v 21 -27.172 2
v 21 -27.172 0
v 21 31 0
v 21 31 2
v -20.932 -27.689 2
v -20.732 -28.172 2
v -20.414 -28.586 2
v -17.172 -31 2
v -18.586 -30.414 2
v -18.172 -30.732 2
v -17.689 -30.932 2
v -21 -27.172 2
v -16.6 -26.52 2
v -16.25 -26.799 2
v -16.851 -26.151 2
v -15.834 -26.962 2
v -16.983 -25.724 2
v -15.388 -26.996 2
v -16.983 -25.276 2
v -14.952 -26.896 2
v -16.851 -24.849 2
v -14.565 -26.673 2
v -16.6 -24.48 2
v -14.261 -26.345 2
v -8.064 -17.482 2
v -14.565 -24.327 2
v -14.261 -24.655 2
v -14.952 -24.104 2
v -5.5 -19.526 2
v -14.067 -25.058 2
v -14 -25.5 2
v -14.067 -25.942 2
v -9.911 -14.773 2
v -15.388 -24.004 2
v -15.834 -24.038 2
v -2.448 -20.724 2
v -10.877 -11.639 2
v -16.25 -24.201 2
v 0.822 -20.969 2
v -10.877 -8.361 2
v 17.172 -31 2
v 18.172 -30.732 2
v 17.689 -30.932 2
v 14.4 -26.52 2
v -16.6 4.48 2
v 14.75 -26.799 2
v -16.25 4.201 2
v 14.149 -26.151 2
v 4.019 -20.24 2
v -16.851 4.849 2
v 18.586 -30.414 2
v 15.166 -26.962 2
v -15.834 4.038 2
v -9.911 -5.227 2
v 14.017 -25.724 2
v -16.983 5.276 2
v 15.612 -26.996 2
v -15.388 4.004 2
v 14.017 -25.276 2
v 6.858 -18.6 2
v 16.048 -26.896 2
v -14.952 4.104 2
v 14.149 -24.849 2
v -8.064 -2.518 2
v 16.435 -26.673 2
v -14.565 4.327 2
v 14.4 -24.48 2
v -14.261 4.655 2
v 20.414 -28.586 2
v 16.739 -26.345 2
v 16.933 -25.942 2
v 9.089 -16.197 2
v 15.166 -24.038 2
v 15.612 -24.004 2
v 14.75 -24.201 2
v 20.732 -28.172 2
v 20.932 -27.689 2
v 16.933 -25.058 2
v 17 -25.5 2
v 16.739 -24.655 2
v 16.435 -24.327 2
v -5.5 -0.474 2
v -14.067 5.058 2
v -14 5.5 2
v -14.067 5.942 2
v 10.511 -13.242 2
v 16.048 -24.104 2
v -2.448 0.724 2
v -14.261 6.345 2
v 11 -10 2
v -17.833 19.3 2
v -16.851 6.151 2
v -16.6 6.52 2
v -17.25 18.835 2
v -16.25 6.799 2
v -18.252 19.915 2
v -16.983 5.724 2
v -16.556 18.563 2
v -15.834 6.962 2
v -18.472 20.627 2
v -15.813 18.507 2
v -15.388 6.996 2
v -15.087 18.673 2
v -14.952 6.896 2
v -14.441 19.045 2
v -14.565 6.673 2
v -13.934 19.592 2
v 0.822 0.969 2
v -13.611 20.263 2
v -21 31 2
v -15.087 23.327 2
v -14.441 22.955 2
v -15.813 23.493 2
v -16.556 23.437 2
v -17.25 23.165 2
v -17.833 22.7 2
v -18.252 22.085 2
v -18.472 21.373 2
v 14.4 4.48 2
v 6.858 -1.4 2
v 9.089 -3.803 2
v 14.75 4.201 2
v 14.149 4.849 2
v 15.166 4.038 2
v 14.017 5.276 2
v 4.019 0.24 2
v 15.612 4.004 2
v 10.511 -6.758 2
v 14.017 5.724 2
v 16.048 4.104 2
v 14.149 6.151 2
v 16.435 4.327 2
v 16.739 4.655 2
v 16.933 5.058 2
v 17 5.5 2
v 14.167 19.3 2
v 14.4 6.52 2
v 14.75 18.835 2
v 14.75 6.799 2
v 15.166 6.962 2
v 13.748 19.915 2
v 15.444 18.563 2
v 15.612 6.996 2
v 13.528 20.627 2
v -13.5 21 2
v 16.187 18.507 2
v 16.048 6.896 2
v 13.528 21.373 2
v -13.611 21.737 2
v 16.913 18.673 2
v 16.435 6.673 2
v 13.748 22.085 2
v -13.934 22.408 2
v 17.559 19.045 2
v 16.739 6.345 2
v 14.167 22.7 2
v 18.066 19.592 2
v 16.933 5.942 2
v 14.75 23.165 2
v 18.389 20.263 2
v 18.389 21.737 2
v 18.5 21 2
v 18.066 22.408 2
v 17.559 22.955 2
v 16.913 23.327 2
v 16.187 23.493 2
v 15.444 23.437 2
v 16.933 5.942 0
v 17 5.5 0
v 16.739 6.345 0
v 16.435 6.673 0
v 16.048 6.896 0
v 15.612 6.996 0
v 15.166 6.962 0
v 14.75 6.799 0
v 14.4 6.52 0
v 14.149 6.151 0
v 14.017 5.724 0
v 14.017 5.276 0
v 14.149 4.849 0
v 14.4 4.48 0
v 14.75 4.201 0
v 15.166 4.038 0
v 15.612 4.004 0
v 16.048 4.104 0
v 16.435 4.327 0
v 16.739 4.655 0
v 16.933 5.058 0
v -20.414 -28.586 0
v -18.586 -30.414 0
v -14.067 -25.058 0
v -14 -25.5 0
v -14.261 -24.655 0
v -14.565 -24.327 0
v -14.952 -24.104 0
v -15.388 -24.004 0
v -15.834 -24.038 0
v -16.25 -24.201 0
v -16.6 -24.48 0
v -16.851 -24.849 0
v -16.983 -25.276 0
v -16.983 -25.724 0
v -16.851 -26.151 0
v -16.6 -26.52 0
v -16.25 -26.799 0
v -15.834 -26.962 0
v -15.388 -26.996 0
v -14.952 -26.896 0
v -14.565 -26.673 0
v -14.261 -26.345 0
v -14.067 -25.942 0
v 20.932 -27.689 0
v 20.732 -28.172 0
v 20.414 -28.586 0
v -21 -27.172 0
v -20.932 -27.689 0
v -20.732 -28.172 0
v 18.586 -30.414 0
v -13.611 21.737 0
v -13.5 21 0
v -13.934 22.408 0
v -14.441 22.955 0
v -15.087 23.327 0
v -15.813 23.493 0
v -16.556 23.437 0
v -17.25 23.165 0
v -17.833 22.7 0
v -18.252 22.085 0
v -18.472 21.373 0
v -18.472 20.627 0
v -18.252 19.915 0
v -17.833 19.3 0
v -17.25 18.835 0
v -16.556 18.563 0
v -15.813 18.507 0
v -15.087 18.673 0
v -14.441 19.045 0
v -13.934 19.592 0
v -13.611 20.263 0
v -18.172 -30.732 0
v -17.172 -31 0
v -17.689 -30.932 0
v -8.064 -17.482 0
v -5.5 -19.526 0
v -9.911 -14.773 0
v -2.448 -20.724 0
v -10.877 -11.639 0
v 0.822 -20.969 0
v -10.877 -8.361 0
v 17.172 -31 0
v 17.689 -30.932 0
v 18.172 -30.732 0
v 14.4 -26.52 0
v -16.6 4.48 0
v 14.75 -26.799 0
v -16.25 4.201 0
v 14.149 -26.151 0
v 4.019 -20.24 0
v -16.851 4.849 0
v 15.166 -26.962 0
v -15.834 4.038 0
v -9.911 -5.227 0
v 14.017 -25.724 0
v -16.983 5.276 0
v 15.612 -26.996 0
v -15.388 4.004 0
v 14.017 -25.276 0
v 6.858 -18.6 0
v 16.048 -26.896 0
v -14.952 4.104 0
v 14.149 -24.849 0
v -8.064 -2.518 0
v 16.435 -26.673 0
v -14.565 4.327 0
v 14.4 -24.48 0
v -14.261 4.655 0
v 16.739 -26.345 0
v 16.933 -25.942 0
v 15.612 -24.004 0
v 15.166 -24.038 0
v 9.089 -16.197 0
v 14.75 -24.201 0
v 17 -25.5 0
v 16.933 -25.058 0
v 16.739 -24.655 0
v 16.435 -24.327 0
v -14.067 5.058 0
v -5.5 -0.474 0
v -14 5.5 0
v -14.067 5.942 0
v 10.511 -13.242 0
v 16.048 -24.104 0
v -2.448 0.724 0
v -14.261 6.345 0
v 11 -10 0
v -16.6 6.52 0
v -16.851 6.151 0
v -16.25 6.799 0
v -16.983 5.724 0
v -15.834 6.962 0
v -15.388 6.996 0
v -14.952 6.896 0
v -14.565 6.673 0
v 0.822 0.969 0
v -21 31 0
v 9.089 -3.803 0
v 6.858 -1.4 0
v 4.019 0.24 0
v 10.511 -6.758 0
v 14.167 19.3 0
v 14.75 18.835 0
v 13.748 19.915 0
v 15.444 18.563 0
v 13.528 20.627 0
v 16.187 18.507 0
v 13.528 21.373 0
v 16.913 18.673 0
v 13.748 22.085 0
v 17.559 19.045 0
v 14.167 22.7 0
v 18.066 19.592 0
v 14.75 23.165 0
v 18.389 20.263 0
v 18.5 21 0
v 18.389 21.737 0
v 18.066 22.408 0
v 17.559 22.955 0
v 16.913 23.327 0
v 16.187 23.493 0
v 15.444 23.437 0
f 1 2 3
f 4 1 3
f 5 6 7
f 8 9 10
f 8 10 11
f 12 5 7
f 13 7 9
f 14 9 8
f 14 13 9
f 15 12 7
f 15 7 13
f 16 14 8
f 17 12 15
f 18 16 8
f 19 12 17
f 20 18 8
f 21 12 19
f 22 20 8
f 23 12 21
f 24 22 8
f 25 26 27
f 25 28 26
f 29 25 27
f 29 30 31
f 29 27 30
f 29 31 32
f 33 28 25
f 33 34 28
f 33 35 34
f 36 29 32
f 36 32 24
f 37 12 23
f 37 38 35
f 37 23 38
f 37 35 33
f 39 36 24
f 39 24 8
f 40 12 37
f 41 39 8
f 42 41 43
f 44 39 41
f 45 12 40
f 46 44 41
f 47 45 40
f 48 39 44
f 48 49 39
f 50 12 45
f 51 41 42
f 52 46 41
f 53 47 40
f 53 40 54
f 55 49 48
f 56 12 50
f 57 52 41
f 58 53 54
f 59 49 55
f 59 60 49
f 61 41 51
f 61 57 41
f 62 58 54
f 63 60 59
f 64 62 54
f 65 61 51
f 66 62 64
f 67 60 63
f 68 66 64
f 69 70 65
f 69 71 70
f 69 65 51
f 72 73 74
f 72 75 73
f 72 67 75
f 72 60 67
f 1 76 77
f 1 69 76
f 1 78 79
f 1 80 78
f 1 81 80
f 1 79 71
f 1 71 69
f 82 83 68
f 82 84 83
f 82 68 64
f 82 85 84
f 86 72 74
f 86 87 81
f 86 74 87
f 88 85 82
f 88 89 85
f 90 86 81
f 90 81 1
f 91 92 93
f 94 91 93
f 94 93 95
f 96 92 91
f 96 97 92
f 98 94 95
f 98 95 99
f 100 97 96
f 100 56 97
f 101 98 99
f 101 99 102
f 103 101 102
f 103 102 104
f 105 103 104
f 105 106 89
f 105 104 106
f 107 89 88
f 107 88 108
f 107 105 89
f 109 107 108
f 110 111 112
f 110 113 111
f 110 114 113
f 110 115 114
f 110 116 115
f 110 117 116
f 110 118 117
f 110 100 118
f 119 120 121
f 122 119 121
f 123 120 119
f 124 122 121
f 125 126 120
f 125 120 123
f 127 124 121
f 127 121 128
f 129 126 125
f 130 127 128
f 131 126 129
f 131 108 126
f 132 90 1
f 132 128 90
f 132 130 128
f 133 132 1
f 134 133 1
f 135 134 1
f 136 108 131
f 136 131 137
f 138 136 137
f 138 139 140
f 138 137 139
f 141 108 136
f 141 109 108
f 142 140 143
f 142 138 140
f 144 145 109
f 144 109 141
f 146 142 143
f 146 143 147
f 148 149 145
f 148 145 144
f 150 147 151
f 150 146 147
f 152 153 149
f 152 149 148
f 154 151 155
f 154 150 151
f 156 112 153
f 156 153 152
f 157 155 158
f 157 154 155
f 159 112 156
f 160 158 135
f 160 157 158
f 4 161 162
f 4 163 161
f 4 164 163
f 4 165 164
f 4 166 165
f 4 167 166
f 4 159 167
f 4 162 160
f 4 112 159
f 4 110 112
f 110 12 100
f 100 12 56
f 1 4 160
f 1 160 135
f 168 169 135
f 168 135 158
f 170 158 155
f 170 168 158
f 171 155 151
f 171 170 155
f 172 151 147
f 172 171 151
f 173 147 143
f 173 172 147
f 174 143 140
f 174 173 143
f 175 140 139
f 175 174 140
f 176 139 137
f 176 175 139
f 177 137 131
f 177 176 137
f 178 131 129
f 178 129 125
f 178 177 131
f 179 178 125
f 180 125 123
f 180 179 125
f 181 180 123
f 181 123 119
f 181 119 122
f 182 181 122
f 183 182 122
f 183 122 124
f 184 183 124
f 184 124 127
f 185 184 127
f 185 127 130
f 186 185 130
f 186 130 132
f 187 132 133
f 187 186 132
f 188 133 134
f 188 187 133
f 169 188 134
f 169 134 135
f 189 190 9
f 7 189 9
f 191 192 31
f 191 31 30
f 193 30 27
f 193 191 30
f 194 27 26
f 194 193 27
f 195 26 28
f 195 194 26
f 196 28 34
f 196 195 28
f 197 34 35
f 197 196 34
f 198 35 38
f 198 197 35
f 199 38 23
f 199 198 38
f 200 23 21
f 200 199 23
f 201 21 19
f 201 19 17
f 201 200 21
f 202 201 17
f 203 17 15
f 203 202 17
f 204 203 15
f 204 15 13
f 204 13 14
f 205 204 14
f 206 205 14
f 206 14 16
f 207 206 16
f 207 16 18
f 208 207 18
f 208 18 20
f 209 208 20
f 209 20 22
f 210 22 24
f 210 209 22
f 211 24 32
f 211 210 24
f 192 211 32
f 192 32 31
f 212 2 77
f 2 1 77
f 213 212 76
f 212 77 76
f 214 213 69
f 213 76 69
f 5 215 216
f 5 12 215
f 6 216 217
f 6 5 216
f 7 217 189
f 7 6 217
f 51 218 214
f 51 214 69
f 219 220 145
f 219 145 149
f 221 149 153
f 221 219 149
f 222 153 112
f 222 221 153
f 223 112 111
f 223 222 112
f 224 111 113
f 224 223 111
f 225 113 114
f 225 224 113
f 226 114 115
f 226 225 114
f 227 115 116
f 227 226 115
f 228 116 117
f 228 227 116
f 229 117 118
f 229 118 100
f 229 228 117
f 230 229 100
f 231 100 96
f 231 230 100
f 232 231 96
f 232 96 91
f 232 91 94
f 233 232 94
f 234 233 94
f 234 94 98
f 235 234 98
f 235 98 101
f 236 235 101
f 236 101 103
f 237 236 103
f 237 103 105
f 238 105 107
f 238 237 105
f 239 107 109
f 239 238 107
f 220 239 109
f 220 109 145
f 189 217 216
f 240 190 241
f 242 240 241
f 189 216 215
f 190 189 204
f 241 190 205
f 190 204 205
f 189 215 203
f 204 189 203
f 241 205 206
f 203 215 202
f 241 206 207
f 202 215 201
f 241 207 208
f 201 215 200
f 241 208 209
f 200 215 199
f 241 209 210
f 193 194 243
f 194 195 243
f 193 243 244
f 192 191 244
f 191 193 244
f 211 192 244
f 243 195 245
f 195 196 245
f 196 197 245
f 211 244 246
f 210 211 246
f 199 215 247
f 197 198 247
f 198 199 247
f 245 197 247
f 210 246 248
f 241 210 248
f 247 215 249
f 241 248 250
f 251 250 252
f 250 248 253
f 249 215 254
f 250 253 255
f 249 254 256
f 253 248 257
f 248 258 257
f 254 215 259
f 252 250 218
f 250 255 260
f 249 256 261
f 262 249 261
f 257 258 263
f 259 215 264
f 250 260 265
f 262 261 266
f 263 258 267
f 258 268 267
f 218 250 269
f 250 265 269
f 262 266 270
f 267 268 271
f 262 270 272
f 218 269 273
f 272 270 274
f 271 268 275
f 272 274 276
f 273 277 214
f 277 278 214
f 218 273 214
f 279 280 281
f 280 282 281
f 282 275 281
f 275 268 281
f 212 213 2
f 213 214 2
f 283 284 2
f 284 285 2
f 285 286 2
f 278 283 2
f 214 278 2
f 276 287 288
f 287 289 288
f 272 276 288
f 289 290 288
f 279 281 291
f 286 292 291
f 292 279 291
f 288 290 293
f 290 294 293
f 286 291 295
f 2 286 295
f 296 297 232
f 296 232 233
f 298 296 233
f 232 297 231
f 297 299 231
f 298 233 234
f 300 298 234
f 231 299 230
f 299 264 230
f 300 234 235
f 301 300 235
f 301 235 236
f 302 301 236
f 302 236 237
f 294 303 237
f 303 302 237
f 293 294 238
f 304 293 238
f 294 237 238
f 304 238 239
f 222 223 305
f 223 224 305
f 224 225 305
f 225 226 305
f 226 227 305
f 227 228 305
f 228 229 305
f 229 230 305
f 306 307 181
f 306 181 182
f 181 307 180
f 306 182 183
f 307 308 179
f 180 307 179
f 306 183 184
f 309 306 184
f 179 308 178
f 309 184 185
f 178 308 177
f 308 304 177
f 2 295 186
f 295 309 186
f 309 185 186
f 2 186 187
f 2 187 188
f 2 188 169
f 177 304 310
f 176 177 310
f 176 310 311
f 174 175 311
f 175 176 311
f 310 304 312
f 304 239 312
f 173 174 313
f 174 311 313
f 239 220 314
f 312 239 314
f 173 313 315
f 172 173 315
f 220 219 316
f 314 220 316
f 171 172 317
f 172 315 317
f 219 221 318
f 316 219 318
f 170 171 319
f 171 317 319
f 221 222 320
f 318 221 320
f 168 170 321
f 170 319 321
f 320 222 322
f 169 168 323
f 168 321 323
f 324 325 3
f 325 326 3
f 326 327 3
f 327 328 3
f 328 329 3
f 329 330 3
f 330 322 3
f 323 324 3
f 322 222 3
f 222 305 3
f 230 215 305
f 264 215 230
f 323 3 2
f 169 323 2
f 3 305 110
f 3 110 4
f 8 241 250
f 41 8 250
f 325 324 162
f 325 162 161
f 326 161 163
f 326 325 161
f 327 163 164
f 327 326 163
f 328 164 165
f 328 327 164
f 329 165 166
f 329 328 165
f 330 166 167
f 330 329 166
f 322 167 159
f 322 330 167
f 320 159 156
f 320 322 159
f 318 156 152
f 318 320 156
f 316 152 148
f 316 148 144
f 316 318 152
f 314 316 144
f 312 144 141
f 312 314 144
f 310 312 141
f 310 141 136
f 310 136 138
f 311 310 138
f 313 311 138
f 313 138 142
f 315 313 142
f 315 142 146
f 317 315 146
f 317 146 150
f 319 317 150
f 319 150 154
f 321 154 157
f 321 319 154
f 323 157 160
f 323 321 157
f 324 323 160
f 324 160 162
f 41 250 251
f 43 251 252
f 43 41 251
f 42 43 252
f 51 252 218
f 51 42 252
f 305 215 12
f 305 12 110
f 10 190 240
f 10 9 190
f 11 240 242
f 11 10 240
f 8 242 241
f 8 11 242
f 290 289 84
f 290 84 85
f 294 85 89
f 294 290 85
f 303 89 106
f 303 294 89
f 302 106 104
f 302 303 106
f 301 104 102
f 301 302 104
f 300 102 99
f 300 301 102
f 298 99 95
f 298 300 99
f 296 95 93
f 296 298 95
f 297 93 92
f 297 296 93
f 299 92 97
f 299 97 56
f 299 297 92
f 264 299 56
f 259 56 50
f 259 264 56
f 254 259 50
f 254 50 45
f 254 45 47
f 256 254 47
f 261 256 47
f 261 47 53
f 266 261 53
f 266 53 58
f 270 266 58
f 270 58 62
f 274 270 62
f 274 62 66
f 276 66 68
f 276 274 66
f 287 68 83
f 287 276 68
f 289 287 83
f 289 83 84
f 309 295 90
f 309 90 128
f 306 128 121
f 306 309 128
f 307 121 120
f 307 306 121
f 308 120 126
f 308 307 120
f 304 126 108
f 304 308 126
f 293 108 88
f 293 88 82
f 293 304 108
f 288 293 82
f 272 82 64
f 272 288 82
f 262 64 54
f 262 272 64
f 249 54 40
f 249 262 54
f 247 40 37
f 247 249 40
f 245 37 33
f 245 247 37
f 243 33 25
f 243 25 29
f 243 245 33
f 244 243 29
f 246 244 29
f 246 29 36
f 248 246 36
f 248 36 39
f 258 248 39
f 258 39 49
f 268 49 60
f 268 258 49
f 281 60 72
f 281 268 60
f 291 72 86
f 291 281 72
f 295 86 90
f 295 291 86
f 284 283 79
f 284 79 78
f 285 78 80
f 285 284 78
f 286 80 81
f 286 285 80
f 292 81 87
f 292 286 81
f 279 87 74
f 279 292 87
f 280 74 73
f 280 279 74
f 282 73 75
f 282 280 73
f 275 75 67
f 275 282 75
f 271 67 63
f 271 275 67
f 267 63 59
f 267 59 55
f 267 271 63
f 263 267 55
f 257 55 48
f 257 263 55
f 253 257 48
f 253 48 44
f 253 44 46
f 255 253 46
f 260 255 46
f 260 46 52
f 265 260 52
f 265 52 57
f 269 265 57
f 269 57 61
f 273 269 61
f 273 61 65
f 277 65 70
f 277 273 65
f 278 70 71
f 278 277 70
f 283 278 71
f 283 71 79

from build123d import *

# Parameters (mm, degrees)
F0_W     = 42
F0_H     = 62
F0_R     = 1.5
F0_R_2   = 11
F0_R_3   = 2.5
F1_DEPTH = 2
F2_SIZE  = 3
F3_R     = 2


with BuildPart() as f1:
    # F0 (on Top) → F1 (new body)
    with BuildSketch(Plane.XY):
        Rectangle(F0_W, F0_H)
        with Locations((-15.5, -25.5)):
            Circle(F0_R, mode=Mode.SUBTRACT)
        with Locations((15.5, -25.5)):
            Circle(F0_R, mode=Mode.SUBTRACT)
        with Locations((0, -10)):
            Circle(F0_R_2, mode=Mode.SUBTRACT)
        with Locations((-15.5, 5.5)):
            Circle(F0_R, mode=Mode.SUBTRACT)
        with Locations((-16, 21)):
            Circle(F0_R_3, mode=Mode.SUBTRACT)
        with Locations((15.5, 5.5)):
            Circle(F0_R, mode=Mode.SUBTRACT)
        with Locations((16, 21)):
            Circle(F0_R_3, mode=Mode.SUBTRACT)
    extrude(amount=F1_DEPTH)

    # F2
    f2_edges = [f1.edges().sort_by_distance(p)[0] for p in [
        (-21, -31, 1),
        (21, -31, 1),
    ]]
    chamfer(f2_edges, length=F2_SIZE)

    # F3
    f3_edges = [f1.edges().sort_by_distance(p)[0] for p in [
        (-18, -31, 1),
        (18, -31, 1),
        (21, -28, 1),
        (-21, -28, 1),
    ]]
    fillet(f3_edges, radius=F3_R)


solid = f1.part
